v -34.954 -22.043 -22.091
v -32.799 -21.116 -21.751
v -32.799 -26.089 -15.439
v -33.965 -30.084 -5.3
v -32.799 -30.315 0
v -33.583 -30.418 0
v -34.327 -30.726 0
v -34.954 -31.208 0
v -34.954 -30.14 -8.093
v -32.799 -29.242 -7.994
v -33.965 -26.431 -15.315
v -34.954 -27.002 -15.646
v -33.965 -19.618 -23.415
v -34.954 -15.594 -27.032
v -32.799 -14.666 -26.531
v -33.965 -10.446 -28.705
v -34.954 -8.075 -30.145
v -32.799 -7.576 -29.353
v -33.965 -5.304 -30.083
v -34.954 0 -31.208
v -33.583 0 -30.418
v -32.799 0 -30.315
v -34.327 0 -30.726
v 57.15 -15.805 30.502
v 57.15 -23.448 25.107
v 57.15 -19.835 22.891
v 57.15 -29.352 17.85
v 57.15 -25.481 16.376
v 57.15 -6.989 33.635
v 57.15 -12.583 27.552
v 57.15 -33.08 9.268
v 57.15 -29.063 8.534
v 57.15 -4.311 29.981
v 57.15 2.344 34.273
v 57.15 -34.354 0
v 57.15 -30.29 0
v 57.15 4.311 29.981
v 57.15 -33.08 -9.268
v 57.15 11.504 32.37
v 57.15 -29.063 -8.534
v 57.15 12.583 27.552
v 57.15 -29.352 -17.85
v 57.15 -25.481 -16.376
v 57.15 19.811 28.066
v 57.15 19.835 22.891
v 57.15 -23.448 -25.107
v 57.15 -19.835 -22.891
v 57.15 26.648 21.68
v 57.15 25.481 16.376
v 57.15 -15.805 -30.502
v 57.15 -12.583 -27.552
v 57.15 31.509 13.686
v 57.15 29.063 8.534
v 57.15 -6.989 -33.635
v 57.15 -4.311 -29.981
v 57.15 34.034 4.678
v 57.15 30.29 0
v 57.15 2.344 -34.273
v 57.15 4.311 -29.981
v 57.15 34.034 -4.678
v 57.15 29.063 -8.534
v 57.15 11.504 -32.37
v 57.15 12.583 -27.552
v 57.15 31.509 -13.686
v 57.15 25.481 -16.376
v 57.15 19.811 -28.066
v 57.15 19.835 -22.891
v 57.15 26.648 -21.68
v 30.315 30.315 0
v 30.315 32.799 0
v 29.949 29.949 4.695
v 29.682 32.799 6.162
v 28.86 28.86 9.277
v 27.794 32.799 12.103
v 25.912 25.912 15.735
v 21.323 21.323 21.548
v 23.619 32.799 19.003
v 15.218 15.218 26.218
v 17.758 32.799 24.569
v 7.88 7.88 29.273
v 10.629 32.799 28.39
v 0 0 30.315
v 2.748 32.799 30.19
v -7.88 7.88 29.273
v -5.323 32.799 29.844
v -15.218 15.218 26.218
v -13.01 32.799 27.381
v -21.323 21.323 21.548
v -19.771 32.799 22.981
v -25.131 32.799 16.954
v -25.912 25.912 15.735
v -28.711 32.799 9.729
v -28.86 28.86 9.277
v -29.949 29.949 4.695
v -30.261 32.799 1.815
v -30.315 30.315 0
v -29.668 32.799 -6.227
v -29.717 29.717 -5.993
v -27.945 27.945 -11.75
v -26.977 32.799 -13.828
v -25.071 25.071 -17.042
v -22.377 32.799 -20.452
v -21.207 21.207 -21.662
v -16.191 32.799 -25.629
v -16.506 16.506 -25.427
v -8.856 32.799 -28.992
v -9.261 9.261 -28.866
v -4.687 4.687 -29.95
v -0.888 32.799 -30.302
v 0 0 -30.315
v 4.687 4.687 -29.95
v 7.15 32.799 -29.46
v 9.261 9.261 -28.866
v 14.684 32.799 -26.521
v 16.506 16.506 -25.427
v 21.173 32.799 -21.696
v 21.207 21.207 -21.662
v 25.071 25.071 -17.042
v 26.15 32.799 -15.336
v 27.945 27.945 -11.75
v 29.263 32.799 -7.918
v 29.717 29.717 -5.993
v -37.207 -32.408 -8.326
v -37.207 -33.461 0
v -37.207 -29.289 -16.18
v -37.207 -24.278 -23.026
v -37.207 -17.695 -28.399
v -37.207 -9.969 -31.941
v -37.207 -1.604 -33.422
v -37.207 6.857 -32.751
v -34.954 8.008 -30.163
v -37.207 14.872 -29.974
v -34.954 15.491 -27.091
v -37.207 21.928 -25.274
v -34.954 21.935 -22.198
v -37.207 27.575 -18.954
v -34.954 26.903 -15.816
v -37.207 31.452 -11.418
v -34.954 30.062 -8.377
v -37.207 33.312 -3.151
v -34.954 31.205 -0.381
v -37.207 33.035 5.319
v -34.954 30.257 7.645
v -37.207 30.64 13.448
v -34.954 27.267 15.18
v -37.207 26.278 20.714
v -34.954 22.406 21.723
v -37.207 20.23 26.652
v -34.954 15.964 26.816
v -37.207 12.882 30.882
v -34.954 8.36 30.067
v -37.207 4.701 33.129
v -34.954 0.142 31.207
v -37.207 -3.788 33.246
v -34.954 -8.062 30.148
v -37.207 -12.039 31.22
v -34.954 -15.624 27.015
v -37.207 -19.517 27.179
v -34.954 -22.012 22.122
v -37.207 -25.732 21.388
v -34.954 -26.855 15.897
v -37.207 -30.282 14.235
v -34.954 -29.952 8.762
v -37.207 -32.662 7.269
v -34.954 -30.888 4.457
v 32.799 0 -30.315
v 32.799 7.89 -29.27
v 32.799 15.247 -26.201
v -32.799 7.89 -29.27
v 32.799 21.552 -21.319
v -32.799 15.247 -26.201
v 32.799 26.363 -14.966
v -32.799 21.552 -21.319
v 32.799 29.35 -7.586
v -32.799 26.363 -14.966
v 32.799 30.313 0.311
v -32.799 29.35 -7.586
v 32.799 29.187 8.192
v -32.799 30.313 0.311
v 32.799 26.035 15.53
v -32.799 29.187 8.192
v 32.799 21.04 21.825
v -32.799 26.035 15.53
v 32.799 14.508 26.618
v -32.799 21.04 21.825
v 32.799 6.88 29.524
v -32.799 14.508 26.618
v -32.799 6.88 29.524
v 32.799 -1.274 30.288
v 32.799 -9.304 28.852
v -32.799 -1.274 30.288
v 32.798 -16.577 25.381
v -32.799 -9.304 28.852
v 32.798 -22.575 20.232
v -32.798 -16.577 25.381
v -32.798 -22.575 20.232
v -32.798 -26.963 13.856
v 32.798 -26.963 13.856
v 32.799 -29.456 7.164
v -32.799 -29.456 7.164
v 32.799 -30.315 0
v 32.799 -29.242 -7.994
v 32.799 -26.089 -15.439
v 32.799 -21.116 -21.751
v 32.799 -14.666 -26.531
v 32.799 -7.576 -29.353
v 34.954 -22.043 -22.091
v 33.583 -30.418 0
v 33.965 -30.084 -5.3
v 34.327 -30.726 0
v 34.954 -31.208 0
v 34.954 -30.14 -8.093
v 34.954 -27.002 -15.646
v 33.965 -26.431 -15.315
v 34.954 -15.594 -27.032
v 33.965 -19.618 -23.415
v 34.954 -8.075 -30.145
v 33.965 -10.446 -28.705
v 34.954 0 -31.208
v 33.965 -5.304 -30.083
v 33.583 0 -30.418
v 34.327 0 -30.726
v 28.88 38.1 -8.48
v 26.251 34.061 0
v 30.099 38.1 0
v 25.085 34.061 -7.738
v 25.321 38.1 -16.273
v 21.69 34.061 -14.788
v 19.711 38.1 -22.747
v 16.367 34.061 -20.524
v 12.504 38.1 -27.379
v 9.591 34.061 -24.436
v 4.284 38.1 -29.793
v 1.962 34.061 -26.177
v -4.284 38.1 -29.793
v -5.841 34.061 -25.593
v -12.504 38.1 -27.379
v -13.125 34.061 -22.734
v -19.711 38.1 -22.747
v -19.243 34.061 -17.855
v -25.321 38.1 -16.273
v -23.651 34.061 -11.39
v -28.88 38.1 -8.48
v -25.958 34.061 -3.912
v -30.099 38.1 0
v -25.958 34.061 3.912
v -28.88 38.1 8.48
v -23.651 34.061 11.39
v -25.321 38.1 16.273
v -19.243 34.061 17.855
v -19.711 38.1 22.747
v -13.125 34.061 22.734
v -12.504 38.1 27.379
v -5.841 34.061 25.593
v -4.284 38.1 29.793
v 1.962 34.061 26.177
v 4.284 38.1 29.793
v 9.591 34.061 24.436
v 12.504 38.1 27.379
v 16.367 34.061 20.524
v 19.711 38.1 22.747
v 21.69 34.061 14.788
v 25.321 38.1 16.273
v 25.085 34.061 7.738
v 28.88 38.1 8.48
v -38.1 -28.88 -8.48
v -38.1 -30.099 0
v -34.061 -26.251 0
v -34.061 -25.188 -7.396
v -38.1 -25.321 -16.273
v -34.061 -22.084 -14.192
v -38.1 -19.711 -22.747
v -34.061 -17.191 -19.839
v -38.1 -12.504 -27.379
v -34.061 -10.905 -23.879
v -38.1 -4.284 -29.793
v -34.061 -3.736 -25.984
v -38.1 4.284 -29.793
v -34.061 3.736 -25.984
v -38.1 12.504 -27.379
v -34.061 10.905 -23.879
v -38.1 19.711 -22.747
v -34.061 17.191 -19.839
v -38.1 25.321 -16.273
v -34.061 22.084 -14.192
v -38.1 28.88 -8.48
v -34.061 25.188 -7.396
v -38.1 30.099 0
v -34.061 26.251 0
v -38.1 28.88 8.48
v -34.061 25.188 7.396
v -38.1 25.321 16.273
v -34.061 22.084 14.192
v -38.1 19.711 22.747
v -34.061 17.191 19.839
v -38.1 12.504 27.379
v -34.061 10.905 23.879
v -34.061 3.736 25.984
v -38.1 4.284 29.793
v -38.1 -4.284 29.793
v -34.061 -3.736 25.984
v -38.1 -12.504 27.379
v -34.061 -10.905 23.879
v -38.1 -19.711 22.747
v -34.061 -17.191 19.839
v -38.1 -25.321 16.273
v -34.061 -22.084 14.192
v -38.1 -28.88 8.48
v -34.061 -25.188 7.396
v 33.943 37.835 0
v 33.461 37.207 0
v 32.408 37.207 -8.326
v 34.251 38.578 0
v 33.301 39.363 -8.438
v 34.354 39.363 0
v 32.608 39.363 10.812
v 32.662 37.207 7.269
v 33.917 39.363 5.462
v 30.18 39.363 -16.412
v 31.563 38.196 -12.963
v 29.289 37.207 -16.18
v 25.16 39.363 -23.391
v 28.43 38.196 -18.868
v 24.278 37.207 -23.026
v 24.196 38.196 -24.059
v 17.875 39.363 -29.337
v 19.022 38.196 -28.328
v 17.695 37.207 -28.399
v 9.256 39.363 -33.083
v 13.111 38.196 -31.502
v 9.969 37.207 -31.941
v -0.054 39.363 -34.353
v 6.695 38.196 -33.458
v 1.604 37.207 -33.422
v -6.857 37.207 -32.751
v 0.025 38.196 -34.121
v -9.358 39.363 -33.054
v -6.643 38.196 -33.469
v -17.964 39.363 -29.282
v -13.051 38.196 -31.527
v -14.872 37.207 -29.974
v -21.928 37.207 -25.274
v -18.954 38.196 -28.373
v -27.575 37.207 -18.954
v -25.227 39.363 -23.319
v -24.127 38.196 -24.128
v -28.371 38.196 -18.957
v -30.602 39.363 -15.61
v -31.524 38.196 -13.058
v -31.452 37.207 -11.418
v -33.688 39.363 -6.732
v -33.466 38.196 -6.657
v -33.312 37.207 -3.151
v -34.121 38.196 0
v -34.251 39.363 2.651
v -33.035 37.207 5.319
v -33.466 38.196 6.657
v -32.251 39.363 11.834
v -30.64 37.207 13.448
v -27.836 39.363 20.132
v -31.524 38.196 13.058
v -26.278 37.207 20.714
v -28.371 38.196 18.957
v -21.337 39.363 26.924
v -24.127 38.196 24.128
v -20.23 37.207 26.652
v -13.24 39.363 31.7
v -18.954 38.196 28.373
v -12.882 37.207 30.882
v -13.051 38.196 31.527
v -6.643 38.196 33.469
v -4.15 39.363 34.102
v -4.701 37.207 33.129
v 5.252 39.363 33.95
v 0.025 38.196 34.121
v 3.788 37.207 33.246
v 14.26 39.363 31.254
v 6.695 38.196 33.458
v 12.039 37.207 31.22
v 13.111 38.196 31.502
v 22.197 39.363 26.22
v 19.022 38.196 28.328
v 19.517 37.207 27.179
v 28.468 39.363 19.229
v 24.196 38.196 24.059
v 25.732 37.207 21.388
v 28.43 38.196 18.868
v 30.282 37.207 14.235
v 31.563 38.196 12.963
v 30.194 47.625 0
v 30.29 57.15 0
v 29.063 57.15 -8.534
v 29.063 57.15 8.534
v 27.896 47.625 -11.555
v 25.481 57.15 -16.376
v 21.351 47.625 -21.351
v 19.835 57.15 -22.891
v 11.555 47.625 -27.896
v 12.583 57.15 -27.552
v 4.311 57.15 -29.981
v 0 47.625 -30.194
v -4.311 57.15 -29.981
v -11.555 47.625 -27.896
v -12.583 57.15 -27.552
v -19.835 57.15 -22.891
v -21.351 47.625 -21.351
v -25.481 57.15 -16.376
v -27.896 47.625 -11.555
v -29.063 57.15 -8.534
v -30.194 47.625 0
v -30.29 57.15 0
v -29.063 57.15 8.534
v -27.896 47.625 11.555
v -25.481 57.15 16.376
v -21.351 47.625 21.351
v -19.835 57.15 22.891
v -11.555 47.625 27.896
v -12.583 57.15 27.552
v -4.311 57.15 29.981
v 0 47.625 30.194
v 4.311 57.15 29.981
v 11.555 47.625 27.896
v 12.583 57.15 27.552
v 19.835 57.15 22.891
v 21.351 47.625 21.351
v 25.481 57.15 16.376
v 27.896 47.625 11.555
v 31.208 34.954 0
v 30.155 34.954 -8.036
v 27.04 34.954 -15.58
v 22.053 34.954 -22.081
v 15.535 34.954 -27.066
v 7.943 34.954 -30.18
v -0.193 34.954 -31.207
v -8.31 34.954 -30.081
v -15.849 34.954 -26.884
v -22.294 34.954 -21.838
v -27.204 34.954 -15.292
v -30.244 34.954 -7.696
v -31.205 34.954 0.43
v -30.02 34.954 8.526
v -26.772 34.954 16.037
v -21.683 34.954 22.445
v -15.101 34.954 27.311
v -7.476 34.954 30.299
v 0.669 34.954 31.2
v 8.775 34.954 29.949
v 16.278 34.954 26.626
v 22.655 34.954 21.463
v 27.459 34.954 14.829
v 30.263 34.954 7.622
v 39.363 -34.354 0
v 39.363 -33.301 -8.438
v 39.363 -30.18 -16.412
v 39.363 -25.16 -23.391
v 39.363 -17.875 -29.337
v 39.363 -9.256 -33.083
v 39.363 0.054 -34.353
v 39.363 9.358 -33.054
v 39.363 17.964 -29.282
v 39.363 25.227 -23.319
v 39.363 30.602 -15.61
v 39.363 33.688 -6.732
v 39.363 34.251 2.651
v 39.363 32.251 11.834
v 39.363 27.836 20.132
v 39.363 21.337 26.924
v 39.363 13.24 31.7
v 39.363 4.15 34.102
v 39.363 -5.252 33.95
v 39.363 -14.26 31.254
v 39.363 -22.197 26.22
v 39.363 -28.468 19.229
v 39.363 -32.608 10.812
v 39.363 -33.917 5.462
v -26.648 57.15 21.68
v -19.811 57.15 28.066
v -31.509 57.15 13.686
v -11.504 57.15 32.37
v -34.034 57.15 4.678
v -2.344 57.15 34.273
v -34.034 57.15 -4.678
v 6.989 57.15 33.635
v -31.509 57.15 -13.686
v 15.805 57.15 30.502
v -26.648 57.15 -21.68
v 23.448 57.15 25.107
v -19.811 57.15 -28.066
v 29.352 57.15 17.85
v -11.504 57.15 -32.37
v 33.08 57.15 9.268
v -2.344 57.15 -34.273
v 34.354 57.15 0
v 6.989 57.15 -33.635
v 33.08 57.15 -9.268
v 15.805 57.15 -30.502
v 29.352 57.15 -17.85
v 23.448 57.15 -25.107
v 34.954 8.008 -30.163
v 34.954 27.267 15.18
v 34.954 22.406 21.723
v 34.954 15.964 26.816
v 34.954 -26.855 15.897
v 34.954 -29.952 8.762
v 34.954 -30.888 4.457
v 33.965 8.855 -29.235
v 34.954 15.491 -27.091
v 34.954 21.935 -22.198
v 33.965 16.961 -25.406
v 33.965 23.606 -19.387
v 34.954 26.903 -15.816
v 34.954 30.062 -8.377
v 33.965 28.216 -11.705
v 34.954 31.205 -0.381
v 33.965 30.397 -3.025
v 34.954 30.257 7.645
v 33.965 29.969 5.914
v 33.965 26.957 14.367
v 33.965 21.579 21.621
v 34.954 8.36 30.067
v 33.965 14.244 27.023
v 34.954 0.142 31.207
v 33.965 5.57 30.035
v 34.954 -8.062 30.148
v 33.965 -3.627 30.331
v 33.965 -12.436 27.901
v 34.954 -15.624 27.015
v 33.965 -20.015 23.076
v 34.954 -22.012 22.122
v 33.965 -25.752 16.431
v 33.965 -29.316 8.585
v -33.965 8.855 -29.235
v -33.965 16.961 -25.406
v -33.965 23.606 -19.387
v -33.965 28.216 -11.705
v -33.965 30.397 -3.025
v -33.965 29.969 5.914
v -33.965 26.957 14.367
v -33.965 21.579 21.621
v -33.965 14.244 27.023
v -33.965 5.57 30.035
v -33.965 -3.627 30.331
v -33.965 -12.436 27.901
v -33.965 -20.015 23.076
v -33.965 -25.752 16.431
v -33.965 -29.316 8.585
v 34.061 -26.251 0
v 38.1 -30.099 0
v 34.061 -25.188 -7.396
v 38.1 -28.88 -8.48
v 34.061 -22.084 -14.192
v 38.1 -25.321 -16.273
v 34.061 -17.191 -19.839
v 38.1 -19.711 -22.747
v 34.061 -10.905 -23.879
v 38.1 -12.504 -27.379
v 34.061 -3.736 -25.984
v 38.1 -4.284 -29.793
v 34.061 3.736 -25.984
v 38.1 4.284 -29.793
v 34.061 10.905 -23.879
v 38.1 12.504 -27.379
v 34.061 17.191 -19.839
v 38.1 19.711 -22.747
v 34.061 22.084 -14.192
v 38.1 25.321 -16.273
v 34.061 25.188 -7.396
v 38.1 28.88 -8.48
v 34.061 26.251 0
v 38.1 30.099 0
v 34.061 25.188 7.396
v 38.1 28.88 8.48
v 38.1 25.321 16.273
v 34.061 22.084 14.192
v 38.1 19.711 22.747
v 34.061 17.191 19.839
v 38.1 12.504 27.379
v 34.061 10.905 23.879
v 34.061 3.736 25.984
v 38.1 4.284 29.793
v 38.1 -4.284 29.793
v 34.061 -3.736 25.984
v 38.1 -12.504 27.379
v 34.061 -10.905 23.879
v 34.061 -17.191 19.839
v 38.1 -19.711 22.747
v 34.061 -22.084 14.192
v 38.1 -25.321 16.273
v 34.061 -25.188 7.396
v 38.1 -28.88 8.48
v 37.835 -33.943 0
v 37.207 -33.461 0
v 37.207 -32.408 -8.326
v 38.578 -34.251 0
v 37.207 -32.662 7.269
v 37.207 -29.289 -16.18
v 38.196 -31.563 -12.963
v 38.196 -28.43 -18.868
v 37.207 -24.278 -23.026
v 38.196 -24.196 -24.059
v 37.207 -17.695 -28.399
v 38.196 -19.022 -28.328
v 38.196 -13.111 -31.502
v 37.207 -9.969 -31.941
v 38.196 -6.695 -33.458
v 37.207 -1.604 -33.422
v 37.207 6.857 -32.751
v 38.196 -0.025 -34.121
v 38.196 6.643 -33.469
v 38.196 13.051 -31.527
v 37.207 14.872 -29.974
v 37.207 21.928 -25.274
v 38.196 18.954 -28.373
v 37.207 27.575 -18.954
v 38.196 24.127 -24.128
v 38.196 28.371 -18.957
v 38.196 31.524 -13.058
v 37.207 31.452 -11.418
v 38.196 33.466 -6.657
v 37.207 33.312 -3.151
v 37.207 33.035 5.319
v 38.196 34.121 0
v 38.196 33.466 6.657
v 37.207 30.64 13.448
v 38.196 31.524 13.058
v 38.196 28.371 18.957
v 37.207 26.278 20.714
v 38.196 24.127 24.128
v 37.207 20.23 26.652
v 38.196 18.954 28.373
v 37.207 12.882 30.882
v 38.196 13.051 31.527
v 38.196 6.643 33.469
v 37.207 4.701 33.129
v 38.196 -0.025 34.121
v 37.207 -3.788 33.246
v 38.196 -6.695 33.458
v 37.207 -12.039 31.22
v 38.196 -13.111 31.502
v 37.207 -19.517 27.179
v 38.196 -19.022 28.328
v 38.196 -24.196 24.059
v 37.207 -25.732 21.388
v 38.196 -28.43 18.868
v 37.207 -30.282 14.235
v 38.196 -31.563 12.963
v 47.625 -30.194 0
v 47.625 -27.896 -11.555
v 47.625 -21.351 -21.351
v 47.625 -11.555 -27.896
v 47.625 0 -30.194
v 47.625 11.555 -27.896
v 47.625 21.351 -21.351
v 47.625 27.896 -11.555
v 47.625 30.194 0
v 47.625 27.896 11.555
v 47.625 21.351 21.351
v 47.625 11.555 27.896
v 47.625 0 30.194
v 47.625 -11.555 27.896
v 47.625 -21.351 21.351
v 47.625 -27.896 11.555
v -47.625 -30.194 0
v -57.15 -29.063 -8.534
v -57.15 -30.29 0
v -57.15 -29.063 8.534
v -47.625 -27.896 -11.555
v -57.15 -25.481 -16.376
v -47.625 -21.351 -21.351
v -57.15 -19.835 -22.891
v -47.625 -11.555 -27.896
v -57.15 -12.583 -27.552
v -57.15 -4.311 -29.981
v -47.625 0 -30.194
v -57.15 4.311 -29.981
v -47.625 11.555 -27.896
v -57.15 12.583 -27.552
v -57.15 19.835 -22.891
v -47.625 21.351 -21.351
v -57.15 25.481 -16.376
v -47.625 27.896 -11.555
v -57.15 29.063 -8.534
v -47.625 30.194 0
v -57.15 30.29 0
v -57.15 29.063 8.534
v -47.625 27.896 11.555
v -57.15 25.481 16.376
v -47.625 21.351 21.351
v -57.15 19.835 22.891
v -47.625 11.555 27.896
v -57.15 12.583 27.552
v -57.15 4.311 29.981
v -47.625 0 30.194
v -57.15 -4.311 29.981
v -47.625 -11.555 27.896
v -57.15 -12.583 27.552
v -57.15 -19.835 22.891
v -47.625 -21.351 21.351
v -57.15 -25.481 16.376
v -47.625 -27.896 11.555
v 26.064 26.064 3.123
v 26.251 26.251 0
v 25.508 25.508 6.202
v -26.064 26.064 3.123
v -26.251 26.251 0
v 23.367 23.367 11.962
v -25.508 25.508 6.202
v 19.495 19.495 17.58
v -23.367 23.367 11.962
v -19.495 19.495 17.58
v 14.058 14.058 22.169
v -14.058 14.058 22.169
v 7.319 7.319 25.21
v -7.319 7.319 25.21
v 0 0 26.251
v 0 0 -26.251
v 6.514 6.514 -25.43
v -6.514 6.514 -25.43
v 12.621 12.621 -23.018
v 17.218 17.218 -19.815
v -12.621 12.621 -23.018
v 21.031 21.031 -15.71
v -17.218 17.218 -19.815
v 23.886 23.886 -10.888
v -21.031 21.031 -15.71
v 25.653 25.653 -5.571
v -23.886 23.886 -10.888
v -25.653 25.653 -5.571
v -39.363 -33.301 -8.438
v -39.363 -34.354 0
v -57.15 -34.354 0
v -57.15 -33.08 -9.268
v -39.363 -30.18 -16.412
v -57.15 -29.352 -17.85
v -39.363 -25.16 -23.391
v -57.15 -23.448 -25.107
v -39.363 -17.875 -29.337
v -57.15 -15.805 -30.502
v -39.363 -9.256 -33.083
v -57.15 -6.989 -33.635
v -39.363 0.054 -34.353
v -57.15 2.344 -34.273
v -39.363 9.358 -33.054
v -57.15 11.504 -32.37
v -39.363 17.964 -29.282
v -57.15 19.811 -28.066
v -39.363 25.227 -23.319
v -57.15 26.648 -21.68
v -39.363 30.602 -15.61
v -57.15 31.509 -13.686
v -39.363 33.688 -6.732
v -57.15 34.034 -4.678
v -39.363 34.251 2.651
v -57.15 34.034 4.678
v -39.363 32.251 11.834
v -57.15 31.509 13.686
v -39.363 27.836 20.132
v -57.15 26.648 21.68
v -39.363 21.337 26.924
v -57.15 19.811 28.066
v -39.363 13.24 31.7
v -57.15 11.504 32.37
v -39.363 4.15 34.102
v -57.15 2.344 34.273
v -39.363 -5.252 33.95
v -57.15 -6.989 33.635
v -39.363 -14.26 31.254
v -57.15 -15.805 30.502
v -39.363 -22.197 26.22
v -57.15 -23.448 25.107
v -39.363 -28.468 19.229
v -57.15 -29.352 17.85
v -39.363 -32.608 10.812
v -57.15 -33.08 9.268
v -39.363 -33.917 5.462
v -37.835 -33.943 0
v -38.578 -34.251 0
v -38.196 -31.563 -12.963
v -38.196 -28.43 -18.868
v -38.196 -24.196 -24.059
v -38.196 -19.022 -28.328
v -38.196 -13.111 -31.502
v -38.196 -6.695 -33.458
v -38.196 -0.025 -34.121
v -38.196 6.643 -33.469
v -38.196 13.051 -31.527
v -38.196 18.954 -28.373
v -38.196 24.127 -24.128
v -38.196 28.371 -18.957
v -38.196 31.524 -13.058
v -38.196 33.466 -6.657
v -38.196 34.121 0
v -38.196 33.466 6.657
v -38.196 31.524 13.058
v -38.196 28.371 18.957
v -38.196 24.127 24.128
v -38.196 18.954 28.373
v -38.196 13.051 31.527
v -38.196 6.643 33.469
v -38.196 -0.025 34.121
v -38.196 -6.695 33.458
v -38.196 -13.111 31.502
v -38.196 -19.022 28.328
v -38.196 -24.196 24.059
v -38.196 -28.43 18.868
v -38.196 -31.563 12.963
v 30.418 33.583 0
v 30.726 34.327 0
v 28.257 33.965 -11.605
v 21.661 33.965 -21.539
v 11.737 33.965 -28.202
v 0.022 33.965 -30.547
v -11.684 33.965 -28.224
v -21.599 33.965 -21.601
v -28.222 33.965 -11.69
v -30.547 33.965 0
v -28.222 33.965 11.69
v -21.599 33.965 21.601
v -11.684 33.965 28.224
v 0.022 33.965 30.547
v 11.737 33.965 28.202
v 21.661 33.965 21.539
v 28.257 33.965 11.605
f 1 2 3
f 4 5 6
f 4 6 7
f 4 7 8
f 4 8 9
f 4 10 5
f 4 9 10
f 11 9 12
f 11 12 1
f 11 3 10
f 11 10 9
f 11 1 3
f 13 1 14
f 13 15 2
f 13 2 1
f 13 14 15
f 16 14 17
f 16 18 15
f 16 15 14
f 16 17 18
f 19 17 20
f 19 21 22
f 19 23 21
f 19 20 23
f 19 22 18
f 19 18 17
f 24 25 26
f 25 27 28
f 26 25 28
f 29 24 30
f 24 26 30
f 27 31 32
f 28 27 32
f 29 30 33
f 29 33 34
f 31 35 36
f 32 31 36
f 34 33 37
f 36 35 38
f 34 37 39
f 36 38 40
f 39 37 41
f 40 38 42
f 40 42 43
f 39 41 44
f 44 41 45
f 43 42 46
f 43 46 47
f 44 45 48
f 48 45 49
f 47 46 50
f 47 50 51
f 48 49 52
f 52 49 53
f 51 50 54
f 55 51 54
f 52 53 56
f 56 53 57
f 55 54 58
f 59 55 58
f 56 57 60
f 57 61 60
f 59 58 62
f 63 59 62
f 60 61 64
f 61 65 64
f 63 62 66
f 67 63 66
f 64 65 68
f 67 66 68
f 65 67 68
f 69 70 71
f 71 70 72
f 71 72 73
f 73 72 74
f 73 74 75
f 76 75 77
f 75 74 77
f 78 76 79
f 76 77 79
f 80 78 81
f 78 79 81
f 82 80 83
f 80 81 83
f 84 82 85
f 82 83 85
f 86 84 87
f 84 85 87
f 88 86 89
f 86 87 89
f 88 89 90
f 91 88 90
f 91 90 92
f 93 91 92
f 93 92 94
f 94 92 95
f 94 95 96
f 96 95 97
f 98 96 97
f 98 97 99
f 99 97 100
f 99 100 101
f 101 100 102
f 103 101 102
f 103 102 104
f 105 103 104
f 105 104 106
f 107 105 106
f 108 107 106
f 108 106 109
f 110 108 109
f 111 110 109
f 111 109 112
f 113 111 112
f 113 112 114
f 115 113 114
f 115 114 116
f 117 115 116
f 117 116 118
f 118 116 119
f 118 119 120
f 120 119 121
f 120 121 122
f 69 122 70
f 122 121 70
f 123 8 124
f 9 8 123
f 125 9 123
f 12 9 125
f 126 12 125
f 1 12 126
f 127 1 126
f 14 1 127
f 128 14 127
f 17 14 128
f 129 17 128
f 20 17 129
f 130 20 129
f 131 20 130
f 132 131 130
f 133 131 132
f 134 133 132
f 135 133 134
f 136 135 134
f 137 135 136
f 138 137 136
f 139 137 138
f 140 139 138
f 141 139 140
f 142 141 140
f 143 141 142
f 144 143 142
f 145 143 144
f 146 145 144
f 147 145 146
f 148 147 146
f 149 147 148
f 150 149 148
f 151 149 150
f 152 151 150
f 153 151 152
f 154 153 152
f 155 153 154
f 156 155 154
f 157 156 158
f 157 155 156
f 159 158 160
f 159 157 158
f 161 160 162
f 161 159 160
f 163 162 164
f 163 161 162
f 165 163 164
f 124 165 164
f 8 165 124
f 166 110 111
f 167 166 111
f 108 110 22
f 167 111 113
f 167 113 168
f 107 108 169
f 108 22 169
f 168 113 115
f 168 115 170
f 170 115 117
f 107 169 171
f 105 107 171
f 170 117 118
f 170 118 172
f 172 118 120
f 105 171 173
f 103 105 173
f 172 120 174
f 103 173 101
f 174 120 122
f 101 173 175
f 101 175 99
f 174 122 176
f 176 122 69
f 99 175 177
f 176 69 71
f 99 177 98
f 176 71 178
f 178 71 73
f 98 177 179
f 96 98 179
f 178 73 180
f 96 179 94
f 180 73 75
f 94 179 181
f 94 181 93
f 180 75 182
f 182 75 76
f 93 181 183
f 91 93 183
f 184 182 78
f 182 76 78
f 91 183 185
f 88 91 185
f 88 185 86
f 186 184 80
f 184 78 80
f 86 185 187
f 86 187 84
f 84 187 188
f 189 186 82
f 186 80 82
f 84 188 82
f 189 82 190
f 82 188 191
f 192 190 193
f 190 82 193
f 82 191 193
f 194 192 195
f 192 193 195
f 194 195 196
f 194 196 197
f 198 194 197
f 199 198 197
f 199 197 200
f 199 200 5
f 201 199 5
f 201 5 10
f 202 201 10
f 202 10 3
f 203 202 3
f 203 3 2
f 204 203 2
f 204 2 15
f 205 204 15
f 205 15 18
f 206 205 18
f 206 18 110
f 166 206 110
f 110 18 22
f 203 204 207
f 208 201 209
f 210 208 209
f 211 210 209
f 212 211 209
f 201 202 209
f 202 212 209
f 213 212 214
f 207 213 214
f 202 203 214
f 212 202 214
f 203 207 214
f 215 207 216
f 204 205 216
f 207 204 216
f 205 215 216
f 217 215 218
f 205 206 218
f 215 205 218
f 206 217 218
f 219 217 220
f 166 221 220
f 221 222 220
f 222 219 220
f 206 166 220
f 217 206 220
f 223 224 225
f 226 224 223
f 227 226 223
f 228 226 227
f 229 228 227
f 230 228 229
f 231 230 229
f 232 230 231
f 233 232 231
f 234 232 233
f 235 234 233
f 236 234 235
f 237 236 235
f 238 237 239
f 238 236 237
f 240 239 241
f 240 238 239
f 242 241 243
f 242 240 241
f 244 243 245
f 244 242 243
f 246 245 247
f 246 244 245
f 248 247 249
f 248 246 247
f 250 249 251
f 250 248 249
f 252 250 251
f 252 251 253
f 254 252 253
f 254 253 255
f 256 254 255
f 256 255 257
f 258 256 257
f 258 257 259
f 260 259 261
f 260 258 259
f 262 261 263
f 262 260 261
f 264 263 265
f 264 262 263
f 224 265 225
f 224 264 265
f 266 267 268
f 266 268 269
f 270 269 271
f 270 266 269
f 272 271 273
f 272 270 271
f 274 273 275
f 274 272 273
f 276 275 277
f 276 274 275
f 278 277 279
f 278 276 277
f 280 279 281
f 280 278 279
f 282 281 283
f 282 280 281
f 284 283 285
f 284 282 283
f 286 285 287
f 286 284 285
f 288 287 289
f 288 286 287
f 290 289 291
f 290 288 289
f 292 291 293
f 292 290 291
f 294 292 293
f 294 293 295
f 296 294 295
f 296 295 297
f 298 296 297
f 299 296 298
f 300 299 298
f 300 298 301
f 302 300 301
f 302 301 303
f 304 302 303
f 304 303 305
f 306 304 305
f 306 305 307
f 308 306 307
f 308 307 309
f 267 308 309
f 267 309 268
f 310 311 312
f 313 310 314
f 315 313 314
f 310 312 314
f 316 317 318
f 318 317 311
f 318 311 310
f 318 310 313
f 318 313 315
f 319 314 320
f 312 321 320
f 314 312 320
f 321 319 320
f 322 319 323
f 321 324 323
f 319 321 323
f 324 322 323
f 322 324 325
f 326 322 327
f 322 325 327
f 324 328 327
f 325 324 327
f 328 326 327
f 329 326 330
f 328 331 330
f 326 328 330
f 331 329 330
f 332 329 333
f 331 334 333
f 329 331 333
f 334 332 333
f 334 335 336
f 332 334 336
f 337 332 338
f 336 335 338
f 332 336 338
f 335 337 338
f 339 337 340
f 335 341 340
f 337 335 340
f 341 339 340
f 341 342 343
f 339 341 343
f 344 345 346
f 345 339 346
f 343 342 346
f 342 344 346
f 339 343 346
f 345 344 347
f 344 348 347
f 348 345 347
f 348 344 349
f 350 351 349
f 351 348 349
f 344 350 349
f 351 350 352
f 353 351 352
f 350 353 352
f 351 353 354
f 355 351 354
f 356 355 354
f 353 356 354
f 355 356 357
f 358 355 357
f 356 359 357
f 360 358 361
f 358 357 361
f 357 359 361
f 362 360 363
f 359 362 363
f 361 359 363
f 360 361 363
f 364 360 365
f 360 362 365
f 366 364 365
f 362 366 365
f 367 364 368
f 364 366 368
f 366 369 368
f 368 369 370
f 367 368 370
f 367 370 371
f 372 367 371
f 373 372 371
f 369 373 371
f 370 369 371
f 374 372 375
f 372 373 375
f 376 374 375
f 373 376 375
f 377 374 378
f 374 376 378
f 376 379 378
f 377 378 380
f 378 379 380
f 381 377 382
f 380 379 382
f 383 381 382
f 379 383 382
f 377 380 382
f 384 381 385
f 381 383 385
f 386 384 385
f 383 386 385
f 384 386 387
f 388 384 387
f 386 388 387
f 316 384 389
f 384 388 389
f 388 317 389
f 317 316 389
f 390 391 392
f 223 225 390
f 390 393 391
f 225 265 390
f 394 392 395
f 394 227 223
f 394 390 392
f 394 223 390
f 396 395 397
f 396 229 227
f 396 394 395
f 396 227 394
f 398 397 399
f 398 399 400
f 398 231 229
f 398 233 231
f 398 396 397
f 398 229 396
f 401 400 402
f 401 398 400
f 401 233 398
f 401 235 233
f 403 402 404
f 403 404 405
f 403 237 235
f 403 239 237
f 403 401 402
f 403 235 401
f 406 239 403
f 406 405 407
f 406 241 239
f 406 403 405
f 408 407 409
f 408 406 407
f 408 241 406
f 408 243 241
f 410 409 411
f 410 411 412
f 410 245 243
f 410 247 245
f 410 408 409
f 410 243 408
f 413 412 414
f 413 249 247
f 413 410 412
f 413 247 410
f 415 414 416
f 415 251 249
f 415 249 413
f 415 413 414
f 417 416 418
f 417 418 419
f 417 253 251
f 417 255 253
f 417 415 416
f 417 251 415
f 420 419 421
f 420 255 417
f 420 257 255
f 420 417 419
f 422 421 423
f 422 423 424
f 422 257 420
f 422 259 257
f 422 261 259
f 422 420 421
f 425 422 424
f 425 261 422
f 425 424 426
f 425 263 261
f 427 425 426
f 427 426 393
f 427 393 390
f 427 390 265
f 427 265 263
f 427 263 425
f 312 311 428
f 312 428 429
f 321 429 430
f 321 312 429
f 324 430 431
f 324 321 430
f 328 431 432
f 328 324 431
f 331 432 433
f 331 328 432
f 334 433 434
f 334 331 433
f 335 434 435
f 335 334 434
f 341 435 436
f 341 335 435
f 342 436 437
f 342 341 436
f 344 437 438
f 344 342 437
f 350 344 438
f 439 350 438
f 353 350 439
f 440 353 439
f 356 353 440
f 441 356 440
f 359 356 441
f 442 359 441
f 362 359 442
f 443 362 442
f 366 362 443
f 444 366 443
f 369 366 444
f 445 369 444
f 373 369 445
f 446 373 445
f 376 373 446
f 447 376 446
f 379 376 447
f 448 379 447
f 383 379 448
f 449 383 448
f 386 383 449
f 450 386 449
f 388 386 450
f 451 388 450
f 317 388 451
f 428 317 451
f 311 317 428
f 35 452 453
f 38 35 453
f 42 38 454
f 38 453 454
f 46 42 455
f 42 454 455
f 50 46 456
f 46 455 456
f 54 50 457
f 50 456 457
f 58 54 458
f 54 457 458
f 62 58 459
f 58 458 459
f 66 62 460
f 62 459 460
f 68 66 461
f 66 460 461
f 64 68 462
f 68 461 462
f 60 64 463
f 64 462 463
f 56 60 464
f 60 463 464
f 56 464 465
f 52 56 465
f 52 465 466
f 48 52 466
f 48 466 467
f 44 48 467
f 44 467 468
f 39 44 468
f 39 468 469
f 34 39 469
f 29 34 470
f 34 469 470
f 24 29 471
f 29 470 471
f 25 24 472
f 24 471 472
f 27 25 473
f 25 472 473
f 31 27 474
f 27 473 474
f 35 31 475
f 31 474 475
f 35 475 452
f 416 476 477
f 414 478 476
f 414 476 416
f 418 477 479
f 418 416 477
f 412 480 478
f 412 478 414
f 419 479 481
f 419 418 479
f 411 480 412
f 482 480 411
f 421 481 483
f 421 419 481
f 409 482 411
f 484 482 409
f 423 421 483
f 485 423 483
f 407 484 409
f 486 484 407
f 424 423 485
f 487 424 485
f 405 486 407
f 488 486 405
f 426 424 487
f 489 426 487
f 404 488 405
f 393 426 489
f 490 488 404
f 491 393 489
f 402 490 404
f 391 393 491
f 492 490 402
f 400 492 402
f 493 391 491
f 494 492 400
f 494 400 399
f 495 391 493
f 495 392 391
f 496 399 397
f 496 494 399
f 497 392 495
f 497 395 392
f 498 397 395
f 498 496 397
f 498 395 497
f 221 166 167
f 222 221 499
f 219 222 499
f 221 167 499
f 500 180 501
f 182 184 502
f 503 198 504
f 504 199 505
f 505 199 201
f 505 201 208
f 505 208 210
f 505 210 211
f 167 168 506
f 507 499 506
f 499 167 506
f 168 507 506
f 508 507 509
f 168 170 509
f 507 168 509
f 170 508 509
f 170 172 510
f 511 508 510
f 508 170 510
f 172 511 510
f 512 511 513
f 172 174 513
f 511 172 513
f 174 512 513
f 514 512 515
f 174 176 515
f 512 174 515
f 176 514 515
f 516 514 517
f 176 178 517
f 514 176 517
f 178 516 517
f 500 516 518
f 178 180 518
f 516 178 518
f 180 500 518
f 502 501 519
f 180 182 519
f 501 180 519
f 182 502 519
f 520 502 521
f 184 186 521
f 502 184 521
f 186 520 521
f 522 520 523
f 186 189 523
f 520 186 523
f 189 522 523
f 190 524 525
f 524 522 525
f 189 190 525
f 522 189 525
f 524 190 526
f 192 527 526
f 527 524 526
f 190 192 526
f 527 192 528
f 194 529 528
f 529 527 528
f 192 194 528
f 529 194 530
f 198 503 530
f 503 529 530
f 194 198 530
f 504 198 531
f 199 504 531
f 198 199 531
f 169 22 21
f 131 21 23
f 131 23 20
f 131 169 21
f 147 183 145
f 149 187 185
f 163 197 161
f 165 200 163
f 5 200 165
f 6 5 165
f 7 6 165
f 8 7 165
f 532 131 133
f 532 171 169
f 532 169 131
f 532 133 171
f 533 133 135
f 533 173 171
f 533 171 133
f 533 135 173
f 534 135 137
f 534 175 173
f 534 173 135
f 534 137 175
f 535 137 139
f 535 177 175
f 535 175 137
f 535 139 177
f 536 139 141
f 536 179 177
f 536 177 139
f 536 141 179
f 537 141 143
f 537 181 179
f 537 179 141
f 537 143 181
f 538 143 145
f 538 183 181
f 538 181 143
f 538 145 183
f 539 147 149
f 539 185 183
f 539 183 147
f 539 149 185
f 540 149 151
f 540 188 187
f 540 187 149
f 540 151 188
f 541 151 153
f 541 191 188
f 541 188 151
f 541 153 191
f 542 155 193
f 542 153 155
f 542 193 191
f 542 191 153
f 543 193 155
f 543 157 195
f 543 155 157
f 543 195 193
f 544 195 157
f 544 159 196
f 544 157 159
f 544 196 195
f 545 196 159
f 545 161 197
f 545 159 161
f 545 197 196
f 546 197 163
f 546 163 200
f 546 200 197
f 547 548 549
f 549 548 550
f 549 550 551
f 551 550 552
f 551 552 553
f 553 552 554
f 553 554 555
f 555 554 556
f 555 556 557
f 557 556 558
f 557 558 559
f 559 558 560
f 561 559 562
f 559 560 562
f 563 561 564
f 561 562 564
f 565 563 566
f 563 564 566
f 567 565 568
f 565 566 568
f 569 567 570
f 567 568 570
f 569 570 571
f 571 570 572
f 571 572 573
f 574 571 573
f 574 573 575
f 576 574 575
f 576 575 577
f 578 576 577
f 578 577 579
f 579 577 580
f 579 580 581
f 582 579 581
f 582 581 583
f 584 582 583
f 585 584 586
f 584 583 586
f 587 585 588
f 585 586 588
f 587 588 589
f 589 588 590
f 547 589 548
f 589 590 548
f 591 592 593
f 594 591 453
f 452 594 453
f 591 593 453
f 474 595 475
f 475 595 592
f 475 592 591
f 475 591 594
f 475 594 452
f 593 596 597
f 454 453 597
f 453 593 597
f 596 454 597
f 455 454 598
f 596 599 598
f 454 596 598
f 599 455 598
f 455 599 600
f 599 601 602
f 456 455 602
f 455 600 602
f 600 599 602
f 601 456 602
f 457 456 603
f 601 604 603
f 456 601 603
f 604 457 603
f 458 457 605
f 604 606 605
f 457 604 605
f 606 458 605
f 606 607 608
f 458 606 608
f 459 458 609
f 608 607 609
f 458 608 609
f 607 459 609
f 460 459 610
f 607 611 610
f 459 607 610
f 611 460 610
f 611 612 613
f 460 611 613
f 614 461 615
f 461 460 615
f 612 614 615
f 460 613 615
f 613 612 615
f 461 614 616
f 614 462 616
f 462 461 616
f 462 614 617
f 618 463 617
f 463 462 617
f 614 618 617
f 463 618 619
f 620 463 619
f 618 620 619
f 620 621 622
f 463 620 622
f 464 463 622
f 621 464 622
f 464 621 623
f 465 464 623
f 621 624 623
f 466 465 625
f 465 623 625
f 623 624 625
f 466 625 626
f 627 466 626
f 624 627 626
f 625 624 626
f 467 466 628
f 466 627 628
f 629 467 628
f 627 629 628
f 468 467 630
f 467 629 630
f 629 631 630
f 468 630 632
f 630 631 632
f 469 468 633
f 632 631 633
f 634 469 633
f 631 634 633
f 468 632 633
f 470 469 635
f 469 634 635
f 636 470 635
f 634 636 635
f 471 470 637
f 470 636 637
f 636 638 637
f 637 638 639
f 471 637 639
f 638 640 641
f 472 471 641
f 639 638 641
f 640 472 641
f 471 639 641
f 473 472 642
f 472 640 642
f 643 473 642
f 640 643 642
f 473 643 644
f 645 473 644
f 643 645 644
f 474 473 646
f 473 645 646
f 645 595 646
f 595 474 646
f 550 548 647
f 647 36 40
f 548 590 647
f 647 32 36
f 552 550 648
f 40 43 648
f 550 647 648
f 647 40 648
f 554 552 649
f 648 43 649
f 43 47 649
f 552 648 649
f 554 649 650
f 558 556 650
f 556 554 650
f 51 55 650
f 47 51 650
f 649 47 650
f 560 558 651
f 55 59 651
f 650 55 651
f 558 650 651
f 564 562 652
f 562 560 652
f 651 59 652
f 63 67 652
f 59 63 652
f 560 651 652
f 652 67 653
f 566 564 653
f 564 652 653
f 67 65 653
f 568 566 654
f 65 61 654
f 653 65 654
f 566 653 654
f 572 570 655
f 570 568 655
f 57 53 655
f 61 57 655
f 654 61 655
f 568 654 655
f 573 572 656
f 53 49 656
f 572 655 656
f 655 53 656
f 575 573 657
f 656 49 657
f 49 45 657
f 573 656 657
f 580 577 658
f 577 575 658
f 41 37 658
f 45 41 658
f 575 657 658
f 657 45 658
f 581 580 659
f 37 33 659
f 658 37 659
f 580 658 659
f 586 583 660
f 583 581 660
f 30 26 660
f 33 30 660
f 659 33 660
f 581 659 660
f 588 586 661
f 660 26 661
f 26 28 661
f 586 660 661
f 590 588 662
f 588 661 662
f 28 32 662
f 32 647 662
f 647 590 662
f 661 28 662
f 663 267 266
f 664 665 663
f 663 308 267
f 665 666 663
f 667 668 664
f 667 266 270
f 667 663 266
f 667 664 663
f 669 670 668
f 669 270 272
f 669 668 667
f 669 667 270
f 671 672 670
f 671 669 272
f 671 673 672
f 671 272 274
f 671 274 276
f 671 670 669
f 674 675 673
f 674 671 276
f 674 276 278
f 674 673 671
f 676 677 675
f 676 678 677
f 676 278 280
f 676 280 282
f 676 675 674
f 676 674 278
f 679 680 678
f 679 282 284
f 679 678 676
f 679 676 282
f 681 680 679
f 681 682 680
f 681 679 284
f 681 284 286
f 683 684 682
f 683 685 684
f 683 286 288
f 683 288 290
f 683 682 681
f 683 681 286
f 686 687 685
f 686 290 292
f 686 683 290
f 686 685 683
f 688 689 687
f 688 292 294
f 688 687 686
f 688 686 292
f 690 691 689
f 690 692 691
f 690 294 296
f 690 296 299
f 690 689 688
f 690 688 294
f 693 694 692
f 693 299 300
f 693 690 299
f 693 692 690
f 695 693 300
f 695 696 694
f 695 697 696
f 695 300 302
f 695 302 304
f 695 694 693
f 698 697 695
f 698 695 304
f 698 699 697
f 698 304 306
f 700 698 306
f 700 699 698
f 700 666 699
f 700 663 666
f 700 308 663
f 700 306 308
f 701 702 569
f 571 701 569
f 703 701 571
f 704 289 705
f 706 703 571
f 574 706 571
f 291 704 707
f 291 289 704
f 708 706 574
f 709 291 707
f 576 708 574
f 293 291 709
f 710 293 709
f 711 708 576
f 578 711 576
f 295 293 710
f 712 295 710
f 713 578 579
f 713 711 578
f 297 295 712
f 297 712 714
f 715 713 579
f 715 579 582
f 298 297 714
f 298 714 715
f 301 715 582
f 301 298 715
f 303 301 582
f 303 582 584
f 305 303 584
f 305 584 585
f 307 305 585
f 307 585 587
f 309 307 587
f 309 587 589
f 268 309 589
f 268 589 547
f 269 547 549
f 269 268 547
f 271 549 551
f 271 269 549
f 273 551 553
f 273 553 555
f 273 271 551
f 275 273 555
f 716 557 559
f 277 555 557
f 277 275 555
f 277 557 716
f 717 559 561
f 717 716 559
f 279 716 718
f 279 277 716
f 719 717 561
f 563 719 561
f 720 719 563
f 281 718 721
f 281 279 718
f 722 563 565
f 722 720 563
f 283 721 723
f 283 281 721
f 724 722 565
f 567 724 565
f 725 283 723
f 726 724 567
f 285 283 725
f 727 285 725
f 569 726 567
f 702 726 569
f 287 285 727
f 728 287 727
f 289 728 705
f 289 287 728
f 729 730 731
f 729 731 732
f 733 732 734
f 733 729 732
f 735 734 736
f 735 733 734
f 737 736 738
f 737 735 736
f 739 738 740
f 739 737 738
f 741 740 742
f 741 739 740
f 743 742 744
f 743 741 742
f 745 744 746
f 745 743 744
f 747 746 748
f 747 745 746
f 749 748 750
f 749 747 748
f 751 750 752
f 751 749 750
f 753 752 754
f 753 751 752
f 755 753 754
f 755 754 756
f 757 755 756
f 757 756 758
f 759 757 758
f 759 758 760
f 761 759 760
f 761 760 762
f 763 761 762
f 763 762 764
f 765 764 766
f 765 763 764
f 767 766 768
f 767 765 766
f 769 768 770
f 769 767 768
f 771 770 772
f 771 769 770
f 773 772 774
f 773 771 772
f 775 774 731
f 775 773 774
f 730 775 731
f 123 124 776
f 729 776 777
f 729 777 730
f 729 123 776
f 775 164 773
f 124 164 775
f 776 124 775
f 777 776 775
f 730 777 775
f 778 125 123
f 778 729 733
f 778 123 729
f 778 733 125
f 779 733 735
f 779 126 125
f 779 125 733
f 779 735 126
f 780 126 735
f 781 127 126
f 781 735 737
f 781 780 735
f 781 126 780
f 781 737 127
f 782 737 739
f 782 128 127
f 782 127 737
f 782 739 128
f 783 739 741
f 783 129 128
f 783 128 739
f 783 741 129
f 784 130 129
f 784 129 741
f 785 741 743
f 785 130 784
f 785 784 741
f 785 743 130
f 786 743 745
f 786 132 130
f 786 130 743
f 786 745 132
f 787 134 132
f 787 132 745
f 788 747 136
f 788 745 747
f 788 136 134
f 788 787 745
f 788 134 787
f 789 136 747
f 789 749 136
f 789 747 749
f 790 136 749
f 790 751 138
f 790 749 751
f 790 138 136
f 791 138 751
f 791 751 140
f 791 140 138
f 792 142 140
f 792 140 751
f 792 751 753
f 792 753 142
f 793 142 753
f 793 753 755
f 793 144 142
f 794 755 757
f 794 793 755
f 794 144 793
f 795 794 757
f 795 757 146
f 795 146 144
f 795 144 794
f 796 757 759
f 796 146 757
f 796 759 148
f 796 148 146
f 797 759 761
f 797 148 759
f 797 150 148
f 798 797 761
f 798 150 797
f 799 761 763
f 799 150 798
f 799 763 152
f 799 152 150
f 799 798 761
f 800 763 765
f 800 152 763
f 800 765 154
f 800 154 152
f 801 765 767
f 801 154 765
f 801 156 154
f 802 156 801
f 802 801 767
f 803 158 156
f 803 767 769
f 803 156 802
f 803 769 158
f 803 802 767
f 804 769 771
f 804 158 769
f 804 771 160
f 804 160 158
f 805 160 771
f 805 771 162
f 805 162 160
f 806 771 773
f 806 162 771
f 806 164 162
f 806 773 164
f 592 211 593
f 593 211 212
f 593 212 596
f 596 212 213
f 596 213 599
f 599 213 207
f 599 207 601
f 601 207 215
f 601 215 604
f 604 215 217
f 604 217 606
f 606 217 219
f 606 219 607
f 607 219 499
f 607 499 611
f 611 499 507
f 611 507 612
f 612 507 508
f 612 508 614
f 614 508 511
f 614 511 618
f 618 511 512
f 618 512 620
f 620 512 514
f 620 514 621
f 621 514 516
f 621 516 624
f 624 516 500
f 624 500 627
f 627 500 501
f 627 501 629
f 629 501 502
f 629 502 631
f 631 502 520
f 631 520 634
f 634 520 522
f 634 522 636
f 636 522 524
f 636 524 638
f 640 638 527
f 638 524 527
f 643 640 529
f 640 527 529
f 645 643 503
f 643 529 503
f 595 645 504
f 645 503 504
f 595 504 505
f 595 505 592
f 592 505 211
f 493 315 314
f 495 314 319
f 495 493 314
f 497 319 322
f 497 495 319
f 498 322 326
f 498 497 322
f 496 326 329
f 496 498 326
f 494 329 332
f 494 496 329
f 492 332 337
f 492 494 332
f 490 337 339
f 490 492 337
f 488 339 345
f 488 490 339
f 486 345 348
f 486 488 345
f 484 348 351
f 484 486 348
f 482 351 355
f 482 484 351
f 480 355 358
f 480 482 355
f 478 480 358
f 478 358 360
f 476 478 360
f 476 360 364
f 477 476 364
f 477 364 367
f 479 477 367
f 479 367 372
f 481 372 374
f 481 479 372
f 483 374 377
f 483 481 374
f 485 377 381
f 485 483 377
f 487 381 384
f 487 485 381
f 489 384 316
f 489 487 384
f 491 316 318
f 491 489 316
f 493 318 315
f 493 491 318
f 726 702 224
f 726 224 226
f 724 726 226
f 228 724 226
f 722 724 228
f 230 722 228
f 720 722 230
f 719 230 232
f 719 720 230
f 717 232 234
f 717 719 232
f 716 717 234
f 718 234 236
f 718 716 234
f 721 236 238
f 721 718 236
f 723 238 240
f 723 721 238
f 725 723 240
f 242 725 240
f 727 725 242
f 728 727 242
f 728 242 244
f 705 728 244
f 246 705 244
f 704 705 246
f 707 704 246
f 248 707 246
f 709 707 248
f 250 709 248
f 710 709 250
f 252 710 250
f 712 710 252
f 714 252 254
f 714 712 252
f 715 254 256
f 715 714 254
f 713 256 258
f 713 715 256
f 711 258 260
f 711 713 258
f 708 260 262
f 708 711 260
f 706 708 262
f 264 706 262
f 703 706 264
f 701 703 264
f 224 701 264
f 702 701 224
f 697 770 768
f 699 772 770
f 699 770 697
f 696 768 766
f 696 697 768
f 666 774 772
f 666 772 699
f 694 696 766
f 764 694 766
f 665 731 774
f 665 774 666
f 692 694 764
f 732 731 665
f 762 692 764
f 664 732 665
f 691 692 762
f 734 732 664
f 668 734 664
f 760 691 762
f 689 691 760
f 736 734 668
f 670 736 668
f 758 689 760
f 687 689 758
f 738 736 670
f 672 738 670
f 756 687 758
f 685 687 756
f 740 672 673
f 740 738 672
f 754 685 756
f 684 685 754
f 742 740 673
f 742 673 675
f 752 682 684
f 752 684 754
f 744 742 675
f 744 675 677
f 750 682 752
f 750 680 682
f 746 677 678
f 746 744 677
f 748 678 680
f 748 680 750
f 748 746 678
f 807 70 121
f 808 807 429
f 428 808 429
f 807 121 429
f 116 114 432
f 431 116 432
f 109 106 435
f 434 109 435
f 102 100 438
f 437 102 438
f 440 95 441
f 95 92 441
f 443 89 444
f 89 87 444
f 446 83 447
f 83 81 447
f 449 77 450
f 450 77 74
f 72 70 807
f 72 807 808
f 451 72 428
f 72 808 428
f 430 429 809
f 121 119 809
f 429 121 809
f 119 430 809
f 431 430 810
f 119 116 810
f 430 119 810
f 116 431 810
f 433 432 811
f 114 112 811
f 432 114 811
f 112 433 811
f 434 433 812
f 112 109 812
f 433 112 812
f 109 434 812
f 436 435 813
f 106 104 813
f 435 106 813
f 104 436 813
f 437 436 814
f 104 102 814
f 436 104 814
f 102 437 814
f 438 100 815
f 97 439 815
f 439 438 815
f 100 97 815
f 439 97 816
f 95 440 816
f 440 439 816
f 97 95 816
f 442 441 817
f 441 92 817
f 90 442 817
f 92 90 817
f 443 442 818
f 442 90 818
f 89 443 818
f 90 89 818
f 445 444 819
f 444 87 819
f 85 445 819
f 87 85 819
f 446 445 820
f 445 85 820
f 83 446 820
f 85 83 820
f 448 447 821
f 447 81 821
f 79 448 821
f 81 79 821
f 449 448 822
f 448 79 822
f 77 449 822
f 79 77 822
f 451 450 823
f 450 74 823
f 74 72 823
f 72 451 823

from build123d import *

# Parameters (mm, degrees)
SKETCH5_R           = 30.3149
BOSS_EXTRUDE1_DEPTH = 68.1228
SKETCH6_R           = 30.3149
BOSS_EXTRUDE2_DEPTH = 34.0614
FILLET1_R           = 3.048


with BuildPart() as part:
    # Sketch1 → Revolve1 (revolve)
    with BuildSketch(Plane.XY):
        Polygon((-38.1, -34.3535), (-34.0614, -30.3149), (-34.0614, -26.2509), (-38.1, -30.099), (-57.15, -30.2895), (-57.15, -34.3535), align=None)
    revolve(axis=Axis((-57.15, 0, 0), (1, 0, 0)))


with BuildPart() as body_2:
    # Mirror1: mirrored copy
    add(part.part.mirror(Plane(origin=(0, 0, 0), x_dir=(0, 0, 1), z_dir=(1, 0, 0))))


with BuildPart() as body_3:
    # Sketch2 → Revolve2 (revolve)
    with BuildSketch(Plane.XY):
        Polygon((30.2895, 57.15), (30.099, 38.1), (26.2509, 34.0614), (30.3149, 34.0614), (34.3535, 38.1), (34.3535, 57.15), align=None)
    revolve(axis=Axis((0, 0, 0), (0, 1, 0)))


with BuildPart() as part_1:
    add(part.part)

    add(body_2.part)  # Boss-Extrude1 merges body 2
    # Sketch5 → Boss-Extrude1 (add)
    with BuildSketch(Plane(origin=(-34.0614, 0, 0), x_dir=(0, 0, -1), z_dir=(1, 0, 0))):
        Circle(SKETCH5_R)
    extrude(amount=BOSS_EXTRUDE1_DEPTH)

    add(body_3.part)  # Boss-Extrude2 merges body 3
    # Sketch6 → Boss-Extrude2 (add)
    with BuildSketch(Plane.XZ.offset(-34.0614)):
        Circle(SKETCH6_R)
    extrude(amount=BOSS_EXTRUDE2_DEPTH)

    # Fillet1
    fillet1_edges = [part_1.edges().sort_by_distance(p)[0] for p in [
        (-34.0614, 21.435871361, 21.435871361),
        (34.0614, 21.435871361, 21.435871361),
        (-38.1, 34.3535, 0),
        (38.1, 34.3535, 0),
        (-30.3149, 34.0614, 0),
        (-34.3535, 38.1, 0),
    ]]
    fillet(fillet1_edges, radius=FILLET1_R)

    # Sketch7 → Cut-Revolve1 (revolve, cut)
    with BuildSketch(Plane.XY):
        Polygon((-57.15, 0), (57.15, 0), (57.15, 30.2895), (38.1, 30.099), (34.0614, 26.2509), (-34.0614, 26.2509), (-38.1, 30.099), (-57.15, 30.2895), align=None)
    revolve(axis=Axis((-57.15, 0, 0), (1, 0, 0)), mode=Mode.SUBTRACT)

    # Sketch8 → Cut-Revolve4 (revolve, cut)
    with BuildSketch(Plane.XY):
        Polygon((30.2895, 57.15), (30.099, 38.1), (26.2509, 34.0614), (26.2509, 0), (0, 0), (0, 57.15), align=None)
    revolve(axis=Axis((0, 0, 0), (0, 1, 0)), mode=Mode.SUBTRACT)


solid = part_1.part
